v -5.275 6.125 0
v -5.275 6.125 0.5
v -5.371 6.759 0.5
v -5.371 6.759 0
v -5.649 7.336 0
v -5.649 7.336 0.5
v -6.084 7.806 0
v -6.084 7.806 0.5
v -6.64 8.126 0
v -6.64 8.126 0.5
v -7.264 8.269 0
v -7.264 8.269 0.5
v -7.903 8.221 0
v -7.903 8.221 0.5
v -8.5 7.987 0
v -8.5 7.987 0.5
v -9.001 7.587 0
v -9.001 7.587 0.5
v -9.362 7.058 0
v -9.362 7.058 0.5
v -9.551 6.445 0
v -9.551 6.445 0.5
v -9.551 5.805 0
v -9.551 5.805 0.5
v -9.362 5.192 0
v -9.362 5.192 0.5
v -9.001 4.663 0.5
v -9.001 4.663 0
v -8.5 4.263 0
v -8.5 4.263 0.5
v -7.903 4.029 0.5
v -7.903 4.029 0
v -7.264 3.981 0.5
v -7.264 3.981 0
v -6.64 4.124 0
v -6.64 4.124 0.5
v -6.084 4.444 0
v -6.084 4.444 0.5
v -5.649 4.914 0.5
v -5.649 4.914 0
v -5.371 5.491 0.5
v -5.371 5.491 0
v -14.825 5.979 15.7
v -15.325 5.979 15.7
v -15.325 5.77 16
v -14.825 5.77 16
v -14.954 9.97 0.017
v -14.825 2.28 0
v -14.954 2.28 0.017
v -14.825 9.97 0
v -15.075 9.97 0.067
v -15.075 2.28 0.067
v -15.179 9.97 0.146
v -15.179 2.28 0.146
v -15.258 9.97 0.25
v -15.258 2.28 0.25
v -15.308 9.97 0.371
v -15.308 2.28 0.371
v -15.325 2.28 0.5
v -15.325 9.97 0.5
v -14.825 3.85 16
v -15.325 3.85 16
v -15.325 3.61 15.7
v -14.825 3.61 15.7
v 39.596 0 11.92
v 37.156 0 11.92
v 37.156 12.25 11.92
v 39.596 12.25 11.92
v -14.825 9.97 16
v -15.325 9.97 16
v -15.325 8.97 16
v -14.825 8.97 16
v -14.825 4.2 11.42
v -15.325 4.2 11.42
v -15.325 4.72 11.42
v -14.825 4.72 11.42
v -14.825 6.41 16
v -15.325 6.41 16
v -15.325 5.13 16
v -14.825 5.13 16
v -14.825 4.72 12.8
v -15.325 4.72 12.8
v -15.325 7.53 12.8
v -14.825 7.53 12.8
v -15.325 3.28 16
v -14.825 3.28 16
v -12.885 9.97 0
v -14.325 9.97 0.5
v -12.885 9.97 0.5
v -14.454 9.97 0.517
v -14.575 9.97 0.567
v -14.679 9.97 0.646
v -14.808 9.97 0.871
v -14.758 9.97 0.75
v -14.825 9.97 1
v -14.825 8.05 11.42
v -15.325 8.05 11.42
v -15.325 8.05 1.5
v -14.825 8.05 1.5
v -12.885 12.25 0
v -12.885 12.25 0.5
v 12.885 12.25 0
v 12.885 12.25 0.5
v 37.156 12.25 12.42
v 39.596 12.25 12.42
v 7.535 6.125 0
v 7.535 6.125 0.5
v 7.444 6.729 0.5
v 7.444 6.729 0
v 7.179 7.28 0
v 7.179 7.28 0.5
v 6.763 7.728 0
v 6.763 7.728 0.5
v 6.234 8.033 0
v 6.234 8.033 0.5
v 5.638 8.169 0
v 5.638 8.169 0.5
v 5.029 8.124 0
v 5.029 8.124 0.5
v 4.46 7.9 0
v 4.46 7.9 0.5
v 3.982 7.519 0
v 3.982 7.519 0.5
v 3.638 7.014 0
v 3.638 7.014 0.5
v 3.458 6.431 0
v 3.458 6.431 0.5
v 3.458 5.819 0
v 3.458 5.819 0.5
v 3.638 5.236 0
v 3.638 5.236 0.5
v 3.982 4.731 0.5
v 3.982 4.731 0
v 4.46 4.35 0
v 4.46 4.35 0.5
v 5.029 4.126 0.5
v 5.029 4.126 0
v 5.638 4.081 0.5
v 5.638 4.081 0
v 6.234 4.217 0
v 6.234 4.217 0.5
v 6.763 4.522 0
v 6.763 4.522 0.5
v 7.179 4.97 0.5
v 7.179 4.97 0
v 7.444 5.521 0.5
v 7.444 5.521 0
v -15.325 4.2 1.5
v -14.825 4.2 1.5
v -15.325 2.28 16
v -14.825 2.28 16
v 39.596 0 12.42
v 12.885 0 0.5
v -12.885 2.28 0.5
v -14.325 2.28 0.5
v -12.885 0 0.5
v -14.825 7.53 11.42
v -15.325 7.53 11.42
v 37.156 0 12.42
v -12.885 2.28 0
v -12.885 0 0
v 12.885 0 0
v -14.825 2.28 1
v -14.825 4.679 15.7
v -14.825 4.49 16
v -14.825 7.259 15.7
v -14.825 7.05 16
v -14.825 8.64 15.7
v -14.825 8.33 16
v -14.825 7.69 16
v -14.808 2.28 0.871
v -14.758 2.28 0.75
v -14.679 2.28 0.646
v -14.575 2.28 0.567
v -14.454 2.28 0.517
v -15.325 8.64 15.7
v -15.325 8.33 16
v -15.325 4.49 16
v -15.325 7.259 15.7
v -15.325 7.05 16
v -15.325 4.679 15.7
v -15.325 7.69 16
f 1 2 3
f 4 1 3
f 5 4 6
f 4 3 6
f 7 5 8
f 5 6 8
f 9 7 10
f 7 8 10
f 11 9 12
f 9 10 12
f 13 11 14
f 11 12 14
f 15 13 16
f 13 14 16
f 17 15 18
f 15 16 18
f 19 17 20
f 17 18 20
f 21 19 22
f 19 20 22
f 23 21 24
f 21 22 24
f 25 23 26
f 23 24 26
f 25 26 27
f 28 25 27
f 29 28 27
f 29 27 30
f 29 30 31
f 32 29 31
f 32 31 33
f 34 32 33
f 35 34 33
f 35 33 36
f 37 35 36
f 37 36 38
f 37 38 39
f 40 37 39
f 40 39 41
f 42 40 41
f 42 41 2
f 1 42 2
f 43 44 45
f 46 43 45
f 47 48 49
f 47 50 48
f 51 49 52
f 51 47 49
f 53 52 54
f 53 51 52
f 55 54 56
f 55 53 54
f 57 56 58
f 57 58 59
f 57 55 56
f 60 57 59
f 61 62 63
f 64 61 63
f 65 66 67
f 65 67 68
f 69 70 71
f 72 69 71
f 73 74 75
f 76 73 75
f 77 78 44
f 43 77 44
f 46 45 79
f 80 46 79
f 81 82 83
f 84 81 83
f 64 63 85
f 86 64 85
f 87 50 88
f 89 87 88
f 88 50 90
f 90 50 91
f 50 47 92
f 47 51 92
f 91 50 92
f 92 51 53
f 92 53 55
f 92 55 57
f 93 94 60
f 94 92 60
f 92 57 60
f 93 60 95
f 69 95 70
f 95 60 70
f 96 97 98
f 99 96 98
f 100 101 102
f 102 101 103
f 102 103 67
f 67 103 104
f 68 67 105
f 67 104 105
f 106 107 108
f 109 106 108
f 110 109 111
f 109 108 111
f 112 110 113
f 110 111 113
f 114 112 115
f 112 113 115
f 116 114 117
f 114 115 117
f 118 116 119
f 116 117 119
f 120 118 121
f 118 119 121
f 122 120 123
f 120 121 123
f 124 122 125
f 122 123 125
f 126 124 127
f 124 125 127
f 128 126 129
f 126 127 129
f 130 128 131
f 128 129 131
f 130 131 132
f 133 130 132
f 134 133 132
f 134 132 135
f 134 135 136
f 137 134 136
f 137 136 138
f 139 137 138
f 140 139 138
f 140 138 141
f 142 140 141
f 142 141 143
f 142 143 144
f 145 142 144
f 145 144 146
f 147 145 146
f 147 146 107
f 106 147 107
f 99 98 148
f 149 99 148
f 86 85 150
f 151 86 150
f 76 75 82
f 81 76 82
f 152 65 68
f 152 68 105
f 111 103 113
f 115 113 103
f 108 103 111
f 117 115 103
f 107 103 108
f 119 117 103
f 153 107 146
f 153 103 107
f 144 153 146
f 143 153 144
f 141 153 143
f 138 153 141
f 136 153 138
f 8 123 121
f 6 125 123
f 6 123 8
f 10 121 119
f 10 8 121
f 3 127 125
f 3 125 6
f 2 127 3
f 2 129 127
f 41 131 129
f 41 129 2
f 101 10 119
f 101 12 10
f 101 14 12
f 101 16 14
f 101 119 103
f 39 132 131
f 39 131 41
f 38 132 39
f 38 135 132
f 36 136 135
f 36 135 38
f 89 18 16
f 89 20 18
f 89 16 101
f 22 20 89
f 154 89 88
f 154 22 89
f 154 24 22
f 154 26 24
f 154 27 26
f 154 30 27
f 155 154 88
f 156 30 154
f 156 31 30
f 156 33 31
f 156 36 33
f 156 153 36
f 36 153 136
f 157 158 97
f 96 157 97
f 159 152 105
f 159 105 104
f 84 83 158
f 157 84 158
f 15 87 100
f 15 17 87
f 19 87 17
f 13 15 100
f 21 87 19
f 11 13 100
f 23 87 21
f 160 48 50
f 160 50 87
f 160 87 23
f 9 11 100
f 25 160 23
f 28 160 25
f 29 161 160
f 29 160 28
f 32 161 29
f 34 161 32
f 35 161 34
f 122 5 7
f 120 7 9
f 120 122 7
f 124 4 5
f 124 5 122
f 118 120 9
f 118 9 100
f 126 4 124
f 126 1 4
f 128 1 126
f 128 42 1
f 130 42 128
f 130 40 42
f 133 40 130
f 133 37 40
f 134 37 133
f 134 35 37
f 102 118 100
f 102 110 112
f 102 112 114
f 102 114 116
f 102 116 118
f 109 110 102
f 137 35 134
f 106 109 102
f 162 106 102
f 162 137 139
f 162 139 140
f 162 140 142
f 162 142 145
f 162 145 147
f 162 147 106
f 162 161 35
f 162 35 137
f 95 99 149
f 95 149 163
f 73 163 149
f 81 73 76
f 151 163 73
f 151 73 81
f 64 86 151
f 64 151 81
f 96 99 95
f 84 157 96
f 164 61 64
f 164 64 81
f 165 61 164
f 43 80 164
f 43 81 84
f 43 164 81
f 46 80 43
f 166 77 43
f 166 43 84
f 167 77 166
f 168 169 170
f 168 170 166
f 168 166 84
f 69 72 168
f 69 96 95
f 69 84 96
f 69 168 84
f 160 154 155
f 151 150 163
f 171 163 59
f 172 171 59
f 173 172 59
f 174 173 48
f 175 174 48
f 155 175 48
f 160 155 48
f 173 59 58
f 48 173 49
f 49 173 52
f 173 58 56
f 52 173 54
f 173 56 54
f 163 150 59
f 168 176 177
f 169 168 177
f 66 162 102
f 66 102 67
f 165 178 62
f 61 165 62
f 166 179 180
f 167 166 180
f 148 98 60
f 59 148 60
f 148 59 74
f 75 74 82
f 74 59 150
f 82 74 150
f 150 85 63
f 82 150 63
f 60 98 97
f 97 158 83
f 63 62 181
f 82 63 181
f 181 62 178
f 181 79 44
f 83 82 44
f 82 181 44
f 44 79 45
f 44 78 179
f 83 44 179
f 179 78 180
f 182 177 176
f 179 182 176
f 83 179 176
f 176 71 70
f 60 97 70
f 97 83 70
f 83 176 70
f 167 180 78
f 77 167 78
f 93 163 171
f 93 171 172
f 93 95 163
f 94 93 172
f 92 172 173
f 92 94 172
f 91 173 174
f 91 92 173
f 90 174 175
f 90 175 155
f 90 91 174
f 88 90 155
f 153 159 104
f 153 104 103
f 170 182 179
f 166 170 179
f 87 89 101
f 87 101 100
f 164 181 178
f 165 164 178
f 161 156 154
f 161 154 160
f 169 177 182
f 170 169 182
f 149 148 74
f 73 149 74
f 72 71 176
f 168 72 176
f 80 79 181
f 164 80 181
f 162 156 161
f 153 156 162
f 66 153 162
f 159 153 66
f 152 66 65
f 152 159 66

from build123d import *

# Parameters (mm, degrees)
F1_DEPTH = 12.25
F2_W     = 2.44
F2_H     = 7.69
F3_DEPTH = 0.5
F6_DEPTH = 0.5
F7_R     = 0.5
F8_R     = 2.15
F8_R_2   = 2.05
F9_DEPTH = 0.501


with BuildPart() as f1:
    # F0 (on Front) → F1 (new body)
    with BuildSketch(Plane.XZ):
        Polygon((-12.885, 0.5), (-12.885, 0), (12.885, 0), (37.155871, 11.92), (39.595871, 11.92), (39.595871, 12.42), (37.155871, 12.42), (12.885, 0.5), align=None)
    extrude(amount=-F1_DEPTH)

    # F2 (on Top) → F3 (join)
    with BuildSketch(Plane.XY):
        with Locations((-14.105, 6.125)):
            Rectangle(F2_W, F2_H)
    extrude(amount=F3_DEPTH)

    # F5 (on offset) → F6 (join)
    with BuildSketch(Plane.YZ.offset(-15.325)):
        Polygon((2.28, 0.5), (9.97, 0.5), (9.97, 15.7), (8.64, 15.7), (7.258645, 15.7), (5.978645, 15.7), (4.678645, 15.7), (3.61, 15.7), (2.28, 15.7), align=None)
        Polygon((8.05, 11.42), (8.05, 1.5), (4.2, 1.5), (4.2, 11.42), (4.72, 11.42), (4.72, 12.8), (7.53, 12.8), (7.53, 11.42), align=None, mode=Mode.SUBTRACT)
        Polygon((8.64, 15.7), (9.97, 15.7), (9.97, 16), (8.97, 16), align=None)
        Polygon((7.258645, 15.7), (8.64, 15.7), (8.33, 16), (7.69, 16), align=None)
        Polygon((5.978645, 15.7), (7.258645, 15.7), (7.05, 16), (6.41, 16), align=None)
        Polygon((5.13, 16), (4.678645, 15.7), (5.978645, 15.7), (5.77, 16), align=None)
        Polygon((3.85, 16), (3.61, 15.7), (4.678645, 15.7), (4.49, 16), align=None)
        Polygon((2.28, 16), (2.28, 15.7), (3.61, 15.7), (3.28, 16), align=None)
    extrude(amount=F6_DEPTH)

    # F7
    f7_edges = [f1.edges().sort_by_distance(p)[0] for p in [
        (-14.825, 6.125, 0.5),
        (-15.325, 6.125, 0),
    ]]
    fillet(f7_edges, radius=F7_R)

    # F8 (on face) → F9 (cut, through all)
    with BuildSketch(Plane.XY.offset(0.5)):
        with Locations((-7.425, 6.125)):
            Circle(F8_R)
        with Locations((5.485, 6.125)):
            Circle(F8_R_2)
    extrude(amount=-F9_DEPTH, mode=Mode.SUBTRACT)


solid = f1.part
